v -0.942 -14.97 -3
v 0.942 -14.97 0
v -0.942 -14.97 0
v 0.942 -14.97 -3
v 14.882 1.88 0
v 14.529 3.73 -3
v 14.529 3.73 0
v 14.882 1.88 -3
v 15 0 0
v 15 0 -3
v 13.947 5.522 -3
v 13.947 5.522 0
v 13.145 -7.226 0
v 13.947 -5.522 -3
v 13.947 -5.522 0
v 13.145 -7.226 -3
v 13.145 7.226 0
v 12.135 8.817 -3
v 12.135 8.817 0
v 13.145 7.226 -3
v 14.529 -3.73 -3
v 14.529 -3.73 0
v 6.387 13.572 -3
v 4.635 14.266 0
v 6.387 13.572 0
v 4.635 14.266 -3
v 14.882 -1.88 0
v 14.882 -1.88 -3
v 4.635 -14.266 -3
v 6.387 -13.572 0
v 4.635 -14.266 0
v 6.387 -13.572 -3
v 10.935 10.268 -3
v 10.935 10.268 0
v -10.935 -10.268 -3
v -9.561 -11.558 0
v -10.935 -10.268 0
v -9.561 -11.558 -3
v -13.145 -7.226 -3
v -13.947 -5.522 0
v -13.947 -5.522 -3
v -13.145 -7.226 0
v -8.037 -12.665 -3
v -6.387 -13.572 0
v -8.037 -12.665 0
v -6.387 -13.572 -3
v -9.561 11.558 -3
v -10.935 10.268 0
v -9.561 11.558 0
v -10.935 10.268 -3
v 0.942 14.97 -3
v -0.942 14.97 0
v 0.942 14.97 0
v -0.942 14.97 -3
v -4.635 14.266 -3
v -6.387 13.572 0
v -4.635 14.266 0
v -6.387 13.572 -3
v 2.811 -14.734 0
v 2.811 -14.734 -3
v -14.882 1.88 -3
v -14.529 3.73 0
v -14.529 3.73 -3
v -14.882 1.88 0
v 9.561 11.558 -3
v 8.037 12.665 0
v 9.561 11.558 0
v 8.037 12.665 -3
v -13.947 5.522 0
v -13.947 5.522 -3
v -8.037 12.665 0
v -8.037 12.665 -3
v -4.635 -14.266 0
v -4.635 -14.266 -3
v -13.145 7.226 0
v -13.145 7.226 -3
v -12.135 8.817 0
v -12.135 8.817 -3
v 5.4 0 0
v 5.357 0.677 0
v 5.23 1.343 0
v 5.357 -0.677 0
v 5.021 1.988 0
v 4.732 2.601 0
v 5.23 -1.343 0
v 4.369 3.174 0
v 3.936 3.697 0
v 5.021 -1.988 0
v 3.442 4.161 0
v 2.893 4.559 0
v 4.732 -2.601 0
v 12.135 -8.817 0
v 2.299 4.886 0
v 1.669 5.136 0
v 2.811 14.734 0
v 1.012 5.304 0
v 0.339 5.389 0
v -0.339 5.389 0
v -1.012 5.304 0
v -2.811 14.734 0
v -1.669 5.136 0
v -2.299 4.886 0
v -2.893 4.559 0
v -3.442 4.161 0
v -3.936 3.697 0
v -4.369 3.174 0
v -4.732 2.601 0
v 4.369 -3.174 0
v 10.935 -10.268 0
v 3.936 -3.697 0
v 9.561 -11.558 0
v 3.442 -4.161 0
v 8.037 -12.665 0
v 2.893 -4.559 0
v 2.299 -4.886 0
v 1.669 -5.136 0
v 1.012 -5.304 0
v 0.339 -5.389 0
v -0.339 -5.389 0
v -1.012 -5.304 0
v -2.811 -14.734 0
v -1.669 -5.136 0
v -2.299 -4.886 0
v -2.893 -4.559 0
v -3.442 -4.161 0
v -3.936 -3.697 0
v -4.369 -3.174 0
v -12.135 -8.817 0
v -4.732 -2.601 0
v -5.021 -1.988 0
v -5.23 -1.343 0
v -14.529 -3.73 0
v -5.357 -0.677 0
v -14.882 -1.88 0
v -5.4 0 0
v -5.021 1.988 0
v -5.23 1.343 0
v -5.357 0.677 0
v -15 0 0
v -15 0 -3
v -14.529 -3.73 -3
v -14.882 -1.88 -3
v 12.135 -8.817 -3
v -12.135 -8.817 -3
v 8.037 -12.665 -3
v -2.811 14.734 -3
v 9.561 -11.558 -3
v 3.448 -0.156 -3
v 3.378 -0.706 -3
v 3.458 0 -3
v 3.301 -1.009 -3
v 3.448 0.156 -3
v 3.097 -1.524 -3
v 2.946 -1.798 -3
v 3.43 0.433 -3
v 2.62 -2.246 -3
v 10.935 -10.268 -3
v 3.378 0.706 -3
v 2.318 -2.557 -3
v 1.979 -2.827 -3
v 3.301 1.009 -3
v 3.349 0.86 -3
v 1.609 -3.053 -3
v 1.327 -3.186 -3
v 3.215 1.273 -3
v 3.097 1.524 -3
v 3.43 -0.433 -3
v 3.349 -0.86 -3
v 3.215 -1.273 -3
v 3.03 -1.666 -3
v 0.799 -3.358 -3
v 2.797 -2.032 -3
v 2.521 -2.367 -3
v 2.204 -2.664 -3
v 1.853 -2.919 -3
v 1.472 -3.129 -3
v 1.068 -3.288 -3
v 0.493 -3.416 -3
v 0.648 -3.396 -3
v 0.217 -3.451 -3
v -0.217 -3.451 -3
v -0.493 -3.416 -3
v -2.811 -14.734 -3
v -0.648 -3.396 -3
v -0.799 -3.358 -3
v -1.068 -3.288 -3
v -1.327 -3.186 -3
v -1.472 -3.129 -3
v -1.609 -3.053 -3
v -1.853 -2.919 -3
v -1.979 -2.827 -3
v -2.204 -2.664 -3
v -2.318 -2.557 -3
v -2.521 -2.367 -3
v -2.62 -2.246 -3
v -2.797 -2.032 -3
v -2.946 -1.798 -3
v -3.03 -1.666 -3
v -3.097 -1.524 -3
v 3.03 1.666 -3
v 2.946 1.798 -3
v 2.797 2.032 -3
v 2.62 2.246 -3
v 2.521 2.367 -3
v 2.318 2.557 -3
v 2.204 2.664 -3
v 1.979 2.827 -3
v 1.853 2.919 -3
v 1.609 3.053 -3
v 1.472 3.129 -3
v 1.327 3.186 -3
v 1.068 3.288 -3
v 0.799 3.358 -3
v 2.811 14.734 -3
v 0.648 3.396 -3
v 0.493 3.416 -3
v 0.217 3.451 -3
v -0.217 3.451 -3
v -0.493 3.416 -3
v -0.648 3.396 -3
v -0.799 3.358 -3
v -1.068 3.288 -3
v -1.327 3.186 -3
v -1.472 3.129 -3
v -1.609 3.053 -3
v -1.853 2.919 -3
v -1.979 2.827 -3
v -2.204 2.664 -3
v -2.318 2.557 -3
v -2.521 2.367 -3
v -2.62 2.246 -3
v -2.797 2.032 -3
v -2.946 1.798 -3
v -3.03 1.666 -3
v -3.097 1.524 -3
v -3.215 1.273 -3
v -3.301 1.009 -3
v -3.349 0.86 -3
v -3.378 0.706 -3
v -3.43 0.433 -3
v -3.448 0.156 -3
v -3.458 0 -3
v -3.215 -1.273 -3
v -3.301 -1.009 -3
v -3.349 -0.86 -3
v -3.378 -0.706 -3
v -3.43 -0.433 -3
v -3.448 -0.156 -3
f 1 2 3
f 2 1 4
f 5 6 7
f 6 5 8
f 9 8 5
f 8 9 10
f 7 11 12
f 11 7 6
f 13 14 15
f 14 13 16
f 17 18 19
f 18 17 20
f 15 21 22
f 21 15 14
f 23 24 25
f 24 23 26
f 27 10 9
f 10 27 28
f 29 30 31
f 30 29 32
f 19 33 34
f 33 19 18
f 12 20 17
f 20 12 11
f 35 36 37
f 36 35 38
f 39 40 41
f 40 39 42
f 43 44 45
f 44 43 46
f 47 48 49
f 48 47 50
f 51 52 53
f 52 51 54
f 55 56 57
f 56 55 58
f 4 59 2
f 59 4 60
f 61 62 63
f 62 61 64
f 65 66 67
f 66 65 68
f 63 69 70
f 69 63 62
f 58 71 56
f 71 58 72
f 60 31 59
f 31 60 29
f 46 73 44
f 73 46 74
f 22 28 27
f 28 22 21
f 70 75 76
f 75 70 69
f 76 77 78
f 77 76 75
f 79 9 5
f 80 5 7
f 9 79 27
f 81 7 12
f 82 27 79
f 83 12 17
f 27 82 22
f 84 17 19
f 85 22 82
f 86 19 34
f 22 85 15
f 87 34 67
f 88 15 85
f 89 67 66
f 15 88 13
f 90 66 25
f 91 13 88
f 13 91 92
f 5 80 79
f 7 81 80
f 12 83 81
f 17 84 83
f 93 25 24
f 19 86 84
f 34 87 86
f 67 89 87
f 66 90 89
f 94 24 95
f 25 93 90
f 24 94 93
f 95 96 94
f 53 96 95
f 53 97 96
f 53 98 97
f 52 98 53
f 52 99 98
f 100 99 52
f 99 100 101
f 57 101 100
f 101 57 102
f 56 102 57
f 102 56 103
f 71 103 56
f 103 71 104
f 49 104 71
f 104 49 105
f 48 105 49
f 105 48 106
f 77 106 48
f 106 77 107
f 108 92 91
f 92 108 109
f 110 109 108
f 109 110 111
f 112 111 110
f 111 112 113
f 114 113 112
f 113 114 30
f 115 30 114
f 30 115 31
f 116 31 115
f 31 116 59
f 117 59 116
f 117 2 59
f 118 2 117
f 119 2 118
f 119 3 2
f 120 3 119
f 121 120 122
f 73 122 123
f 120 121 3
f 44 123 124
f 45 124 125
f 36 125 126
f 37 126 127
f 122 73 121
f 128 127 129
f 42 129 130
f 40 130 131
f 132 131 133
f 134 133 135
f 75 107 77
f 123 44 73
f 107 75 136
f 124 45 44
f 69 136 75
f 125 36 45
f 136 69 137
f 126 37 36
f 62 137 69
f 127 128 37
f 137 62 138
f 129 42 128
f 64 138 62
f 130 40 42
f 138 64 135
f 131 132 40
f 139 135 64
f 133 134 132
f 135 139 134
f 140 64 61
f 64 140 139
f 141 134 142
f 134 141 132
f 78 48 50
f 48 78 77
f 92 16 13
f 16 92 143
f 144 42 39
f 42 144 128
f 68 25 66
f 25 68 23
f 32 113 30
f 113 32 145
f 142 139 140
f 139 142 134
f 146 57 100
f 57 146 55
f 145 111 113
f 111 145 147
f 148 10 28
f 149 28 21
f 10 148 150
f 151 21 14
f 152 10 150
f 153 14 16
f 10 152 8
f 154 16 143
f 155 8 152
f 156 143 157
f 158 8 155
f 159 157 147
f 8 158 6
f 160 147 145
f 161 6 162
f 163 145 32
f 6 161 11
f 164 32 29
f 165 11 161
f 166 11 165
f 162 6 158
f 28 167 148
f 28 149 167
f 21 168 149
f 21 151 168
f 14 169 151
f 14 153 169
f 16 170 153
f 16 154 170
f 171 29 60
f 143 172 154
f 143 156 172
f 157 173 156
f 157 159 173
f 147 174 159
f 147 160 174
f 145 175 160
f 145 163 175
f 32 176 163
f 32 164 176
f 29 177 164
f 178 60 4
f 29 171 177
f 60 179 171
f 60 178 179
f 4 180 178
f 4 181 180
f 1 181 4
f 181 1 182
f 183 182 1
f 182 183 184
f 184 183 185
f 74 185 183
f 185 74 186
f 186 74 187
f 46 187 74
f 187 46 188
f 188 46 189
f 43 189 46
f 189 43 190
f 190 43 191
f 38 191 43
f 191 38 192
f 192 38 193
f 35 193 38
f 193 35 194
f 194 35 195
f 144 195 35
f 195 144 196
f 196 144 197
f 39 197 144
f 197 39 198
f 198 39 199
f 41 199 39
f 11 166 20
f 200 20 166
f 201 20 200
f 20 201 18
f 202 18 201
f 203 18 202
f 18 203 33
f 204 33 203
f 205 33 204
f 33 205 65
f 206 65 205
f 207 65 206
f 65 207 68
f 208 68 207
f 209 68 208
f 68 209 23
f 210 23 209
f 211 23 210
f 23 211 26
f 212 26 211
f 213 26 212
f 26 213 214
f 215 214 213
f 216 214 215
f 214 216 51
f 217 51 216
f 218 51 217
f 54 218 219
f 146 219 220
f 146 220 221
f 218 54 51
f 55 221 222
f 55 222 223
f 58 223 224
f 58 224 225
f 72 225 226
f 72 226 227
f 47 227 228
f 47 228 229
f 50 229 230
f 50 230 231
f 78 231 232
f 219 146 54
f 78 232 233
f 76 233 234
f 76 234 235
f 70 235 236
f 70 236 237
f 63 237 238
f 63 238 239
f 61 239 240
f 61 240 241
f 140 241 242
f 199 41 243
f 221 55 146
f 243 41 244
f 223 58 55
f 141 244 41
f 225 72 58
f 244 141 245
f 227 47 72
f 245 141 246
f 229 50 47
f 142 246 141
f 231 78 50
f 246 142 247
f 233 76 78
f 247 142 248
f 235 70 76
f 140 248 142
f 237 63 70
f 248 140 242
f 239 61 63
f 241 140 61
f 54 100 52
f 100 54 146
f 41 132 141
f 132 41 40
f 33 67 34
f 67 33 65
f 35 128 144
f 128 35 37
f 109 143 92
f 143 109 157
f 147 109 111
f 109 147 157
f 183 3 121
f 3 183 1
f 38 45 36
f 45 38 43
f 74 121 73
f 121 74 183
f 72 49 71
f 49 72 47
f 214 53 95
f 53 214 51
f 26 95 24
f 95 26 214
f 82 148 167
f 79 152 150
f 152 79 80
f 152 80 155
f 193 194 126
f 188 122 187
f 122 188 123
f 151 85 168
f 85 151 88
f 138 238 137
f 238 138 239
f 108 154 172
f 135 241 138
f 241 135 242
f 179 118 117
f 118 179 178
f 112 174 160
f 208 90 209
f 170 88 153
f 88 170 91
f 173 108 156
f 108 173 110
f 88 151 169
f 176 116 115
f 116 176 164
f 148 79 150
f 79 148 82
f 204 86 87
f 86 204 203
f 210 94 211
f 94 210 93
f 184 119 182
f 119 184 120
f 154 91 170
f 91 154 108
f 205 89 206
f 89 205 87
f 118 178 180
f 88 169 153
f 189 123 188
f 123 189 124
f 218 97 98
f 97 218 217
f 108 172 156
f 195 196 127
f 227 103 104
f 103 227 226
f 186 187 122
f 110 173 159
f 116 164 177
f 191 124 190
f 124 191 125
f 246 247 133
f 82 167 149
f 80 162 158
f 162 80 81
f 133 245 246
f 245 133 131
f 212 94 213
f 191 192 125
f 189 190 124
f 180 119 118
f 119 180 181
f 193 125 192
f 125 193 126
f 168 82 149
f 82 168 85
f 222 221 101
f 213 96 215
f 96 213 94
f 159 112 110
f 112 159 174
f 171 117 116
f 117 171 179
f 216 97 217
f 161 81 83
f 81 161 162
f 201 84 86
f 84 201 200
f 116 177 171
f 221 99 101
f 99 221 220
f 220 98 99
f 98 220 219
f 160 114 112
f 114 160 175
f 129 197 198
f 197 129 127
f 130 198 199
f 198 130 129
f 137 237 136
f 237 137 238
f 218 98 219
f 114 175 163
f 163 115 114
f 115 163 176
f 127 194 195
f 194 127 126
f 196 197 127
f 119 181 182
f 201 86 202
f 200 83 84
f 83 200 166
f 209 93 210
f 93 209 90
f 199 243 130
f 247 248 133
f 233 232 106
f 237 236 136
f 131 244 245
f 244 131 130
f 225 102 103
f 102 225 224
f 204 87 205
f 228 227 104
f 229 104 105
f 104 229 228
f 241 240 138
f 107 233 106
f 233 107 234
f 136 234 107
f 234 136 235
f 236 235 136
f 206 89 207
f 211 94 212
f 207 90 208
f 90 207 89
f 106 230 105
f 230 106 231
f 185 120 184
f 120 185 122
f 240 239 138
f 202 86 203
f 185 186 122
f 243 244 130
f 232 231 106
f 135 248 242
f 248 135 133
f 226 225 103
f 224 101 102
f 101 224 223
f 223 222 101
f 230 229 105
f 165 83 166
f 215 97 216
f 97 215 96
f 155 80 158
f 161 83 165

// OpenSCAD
$fn = 50;


difference() {
	union() {
		translate(v = [0, 0, -3.0000000000]) {
			cylinder(h = 3, r = 15.0000000000);
		}
		translate(v = [0, 0, -3.0000000000]) {
			cylinder(h = 3, r = 2.8750000000);
		}
	}
	union() {
		translate(v = [0, 0, 0]) {
			rotate(a = [0, 0, 0]) {
				difference() {
					union() {
						translate(v = [0, 0, -3.0000000000]) {
							cylinder(h = 3, r = 2.6000000000);
						}
						translate(v = [0, 0, -3.9000000000]) {
							cylinder(h = 3.9000000000, r1 = 2.8750000000, r2 = 5.4000000000);
						}
						translate(v = [0, 0, -3.0000000000]) {
							cylinder(h = 3, r = 2.8750000000);
						}
						translate(v = [0, 0, -3.0000000000]) {
							cylinder(h = 3, r = 2.6000000000);
						}
					}
					union();
				}
			}
		}
	}
}
